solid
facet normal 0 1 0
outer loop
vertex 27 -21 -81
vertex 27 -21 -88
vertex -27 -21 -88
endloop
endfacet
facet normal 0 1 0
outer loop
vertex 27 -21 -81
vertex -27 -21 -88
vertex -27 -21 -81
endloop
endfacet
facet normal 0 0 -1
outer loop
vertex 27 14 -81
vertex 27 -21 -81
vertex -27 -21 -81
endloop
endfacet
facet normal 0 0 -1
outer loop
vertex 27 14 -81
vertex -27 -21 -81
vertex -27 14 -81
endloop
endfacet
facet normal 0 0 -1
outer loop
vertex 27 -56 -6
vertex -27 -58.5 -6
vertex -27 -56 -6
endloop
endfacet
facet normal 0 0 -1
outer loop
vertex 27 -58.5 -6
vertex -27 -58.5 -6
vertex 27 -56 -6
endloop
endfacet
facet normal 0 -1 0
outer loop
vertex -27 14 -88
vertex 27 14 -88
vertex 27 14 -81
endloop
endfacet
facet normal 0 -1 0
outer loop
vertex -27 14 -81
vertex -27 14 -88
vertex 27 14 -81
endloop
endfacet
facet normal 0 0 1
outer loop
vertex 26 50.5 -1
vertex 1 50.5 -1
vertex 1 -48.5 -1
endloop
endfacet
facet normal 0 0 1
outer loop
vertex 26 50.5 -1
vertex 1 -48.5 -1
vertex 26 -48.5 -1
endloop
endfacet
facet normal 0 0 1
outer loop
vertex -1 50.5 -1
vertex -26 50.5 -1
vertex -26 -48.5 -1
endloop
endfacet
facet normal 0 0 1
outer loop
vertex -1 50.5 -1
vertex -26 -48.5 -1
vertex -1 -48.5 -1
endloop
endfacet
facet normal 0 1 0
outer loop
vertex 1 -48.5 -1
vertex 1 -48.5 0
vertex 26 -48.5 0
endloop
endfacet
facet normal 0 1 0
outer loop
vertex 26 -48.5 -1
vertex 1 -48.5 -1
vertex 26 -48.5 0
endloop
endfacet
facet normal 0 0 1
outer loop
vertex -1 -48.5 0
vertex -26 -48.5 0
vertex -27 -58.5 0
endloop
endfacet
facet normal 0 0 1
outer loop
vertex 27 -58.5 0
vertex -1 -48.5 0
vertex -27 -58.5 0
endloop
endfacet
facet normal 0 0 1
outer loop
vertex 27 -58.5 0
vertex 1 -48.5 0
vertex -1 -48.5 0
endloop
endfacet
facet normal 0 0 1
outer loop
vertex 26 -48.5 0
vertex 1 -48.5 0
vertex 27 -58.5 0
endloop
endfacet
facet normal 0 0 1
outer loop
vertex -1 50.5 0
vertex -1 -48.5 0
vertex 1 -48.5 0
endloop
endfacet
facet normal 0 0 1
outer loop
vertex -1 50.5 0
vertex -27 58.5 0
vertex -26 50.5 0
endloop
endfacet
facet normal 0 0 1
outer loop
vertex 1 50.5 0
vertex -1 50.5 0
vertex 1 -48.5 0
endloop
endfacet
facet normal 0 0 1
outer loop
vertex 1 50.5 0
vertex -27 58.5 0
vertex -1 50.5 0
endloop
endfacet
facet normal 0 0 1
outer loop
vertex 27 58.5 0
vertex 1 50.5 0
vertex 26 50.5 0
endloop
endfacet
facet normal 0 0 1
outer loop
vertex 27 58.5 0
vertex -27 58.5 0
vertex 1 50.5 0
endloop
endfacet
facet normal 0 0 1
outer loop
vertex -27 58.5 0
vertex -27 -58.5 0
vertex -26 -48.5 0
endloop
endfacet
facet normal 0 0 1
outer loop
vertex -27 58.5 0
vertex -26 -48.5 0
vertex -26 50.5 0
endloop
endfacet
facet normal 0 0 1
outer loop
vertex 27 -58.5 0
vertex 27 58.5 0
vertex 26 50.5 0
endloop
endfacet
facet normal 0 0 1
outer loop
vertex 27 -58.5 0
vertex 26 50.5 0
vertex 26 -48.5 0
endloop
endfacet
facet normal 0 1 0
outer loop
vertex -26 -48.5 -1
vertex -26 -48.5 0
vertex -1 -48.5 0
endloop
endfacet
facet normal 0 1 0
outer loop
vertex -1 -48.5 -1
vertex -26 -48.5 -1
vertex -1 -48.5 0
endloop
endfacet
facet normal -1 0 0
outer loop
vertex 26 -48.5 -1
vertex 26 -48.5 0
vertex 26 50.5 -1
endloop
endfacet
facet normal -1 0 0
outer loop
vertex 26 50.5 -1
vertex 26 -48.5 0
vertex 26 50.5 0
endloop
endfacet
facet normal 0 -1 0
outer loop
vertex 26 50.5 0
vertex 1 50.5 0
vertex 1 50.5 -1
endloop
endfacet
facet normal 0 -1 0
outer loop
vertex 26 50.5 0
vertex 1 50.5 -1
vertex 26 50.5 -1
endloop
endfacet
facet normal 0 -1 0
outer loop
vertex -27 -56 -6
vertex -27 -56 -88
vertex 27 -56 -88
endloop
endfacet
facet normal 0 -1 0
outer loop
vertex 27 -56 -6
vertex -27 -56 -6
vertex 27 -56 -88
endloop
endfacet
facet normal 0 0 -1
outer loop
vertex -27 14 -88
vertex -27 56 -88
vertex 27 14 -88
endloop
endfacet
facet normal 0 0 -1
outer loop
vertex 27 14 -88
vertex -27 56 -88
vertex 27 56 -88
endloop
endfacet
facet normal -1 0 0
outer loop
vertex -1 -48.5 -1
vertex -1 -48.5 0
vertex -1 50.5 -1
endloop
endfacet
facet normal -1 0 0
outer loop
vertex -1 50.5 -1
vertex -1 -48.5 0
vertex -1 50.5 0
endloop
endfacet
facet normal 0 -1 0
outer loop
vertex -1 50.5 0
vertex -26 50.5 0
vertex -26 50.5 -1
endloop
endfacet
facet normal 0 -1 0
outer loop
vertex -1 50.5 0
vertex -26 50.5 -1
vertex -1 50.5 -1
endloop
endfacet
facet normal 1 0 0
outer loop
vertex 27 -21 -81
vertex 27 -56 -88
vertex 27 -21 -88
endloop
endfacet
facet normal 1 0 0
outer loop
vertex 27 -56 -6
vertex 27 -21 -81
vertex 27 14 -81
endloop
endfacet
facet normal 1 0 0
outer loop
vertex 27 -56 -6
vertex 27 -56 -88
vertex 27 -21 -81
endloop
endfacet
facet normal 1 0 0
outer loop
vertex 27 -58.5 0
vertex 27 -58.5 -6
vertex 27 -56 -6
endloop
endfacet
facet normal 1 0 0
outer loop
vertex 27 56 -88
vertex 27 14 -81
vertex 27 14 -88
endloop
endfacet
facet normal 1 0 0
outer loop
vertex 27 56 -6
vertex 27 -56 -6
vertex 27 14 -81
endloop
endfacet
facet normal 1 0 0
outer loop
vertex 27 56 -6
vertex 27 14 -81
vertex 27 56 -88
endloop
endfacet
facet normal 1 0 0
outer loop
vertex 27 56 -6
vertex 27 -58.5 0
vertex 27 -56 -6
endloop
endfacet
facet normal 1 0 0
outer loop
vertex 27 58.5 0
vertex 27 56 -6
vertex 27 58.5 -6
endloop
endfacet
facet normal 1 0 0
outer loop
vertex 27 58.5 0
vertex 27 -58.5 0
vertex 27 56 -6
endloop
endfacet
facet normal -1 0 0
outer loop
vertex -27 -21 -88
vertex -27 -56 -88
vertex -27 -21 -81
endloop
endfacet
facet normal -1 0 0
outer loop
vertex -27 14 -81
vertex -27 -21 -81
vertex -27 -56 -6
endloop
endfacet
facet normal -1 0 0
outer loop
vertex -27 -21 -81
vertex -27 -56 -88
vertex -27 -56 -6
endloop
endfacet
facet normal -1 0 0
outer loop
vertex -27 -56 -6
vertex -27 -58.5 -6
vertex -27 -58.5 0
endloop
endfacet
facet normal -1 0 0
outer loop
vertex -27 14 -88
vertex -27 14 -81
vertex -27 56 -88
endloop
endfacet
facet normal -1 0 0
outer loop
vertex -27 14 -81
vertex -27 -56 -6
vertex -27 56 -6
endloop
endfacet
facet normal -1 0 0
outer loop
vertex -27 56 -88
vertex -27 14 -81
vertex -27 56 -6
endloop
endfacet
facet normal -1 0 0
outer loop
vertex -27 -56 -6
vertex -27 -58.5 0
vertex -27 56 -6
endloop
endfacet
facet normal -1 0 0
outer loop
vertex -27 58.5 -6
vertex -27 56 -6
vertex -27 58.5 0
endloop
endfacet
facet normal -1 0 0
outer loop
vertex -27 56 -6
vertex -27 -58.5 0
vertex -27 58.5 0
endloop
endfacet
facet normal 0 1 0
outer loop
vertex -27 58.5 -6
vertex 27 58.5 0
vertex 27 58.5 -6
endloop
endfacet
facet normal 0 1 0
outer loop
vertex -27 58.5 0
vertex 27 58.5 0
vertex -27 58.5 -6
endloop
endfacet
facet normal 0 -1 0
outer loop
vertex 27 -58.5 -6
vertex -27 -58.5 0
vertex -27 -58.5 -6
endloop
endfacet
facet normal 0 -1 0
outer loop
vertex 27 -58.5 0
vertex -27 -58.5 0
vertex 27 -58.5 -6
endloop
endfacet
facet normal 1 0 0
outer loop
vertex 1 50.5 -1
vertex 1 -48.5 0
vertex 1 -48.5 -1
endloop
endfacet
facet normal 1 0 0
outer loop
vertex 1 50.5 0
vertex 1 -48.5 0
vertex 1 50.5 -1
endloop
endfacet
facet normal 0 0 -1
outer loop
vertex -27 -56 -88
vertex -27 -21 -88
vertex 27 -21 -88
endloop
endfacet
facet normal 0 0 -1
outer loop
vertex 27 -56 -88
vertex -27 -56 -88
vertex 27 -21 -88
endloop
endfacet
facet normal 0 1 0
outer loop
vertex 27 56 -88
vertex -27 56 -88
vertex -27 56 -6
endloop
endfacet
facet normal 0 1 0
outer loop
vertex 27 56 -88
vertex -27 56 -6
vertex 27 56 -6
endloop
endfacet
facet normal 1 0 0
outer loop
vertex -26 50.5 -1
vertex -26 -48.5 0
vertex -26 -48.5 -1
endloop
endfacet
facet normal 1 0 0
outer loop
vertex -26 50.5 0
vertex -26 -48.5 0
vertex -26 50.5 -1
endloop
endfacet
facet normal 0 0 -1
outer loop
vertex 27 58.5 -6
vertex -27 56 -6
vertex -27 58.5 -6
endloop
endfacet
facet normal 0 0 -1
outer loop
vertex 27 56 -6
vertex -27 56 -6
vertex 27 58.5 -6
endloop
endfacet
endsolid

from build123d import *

# Parameters (mm, degrees)
F0_W     = 27
F0_H     = 117
F0_W_2   = 25
F0_H_2   = 99
F1_DEPTH = 88
F2_DEPTH = 1
F3_W     = 54
F3_H     = 2.5
F4_DEPTH = 82
F5_W     = 35
F5_H     = 7
F6_DEPTH = 54


with BuildPart() as f1:
    # F0 (on Top) → F1 (new body)
    with BuildSketch(Plane.XY):
        with Locations((-13.5, 0)):
            Rectangle(F0_W, F0_H)
        with Locations((-13.5, 1)):
            Rectangle(F0_W_2, F0_H_2, mode=Mode.SUBTRACT)
        with Locations((13.5, 0)):
            Rectangle(F0_W, F0_H)
        with Locations((13.5, 1)):
            Rectangle(F0_W_2, F0_H_2, mode=Mode.SUBTRACT)
        with Locations((-13.5, 1)):
            Rectangle(F0_W_2, F0_H_2)
        with Locations((13.5, 1)):
            Rectangle(F0_W_2, F0_H_2)
    extrude(amount=-F1_DEPTH)

    # F0 (on Top) → F2 (cut)
    with BuildSketch(Plane.XY):
        with Locations((-13.5, 1)):
            Rectangle(F0_W_2, F0_H_2)
        with Locations((13.5, 1)):
            Rectangle(F0_W_2, F0_H_2)
    extrude(amount=-F2_DEPTH, mode=Mode.SUBTRACT)

    # F3 (on face) → F4 (cut)
    with BuildSketch(Plane(origin=(0, 0, -88), x_dir=(1, 0, 0), z_dir=(0, 0, -1))):
        with Locations((0, 57.25)):
            Rectangle(F3_W, F3_H)
        with Locations((0, -57.25)):
            Rectangle(F3_W, F3_H)
    extrude(amount=-F4_DEPTH, mode=Mode.SUBTRACT)

    # F5 (on face) → F6 (cut, through all)
    with BuildSketch(Plane.YZ.offset(27)):
        with Locations((-3.5, -84.5)):
            Rectangle(F5_W, F5_H)
    extrude(amount=-F6_DEPTH, mode=Mode.SUBTRACT)


solid = f1.part
